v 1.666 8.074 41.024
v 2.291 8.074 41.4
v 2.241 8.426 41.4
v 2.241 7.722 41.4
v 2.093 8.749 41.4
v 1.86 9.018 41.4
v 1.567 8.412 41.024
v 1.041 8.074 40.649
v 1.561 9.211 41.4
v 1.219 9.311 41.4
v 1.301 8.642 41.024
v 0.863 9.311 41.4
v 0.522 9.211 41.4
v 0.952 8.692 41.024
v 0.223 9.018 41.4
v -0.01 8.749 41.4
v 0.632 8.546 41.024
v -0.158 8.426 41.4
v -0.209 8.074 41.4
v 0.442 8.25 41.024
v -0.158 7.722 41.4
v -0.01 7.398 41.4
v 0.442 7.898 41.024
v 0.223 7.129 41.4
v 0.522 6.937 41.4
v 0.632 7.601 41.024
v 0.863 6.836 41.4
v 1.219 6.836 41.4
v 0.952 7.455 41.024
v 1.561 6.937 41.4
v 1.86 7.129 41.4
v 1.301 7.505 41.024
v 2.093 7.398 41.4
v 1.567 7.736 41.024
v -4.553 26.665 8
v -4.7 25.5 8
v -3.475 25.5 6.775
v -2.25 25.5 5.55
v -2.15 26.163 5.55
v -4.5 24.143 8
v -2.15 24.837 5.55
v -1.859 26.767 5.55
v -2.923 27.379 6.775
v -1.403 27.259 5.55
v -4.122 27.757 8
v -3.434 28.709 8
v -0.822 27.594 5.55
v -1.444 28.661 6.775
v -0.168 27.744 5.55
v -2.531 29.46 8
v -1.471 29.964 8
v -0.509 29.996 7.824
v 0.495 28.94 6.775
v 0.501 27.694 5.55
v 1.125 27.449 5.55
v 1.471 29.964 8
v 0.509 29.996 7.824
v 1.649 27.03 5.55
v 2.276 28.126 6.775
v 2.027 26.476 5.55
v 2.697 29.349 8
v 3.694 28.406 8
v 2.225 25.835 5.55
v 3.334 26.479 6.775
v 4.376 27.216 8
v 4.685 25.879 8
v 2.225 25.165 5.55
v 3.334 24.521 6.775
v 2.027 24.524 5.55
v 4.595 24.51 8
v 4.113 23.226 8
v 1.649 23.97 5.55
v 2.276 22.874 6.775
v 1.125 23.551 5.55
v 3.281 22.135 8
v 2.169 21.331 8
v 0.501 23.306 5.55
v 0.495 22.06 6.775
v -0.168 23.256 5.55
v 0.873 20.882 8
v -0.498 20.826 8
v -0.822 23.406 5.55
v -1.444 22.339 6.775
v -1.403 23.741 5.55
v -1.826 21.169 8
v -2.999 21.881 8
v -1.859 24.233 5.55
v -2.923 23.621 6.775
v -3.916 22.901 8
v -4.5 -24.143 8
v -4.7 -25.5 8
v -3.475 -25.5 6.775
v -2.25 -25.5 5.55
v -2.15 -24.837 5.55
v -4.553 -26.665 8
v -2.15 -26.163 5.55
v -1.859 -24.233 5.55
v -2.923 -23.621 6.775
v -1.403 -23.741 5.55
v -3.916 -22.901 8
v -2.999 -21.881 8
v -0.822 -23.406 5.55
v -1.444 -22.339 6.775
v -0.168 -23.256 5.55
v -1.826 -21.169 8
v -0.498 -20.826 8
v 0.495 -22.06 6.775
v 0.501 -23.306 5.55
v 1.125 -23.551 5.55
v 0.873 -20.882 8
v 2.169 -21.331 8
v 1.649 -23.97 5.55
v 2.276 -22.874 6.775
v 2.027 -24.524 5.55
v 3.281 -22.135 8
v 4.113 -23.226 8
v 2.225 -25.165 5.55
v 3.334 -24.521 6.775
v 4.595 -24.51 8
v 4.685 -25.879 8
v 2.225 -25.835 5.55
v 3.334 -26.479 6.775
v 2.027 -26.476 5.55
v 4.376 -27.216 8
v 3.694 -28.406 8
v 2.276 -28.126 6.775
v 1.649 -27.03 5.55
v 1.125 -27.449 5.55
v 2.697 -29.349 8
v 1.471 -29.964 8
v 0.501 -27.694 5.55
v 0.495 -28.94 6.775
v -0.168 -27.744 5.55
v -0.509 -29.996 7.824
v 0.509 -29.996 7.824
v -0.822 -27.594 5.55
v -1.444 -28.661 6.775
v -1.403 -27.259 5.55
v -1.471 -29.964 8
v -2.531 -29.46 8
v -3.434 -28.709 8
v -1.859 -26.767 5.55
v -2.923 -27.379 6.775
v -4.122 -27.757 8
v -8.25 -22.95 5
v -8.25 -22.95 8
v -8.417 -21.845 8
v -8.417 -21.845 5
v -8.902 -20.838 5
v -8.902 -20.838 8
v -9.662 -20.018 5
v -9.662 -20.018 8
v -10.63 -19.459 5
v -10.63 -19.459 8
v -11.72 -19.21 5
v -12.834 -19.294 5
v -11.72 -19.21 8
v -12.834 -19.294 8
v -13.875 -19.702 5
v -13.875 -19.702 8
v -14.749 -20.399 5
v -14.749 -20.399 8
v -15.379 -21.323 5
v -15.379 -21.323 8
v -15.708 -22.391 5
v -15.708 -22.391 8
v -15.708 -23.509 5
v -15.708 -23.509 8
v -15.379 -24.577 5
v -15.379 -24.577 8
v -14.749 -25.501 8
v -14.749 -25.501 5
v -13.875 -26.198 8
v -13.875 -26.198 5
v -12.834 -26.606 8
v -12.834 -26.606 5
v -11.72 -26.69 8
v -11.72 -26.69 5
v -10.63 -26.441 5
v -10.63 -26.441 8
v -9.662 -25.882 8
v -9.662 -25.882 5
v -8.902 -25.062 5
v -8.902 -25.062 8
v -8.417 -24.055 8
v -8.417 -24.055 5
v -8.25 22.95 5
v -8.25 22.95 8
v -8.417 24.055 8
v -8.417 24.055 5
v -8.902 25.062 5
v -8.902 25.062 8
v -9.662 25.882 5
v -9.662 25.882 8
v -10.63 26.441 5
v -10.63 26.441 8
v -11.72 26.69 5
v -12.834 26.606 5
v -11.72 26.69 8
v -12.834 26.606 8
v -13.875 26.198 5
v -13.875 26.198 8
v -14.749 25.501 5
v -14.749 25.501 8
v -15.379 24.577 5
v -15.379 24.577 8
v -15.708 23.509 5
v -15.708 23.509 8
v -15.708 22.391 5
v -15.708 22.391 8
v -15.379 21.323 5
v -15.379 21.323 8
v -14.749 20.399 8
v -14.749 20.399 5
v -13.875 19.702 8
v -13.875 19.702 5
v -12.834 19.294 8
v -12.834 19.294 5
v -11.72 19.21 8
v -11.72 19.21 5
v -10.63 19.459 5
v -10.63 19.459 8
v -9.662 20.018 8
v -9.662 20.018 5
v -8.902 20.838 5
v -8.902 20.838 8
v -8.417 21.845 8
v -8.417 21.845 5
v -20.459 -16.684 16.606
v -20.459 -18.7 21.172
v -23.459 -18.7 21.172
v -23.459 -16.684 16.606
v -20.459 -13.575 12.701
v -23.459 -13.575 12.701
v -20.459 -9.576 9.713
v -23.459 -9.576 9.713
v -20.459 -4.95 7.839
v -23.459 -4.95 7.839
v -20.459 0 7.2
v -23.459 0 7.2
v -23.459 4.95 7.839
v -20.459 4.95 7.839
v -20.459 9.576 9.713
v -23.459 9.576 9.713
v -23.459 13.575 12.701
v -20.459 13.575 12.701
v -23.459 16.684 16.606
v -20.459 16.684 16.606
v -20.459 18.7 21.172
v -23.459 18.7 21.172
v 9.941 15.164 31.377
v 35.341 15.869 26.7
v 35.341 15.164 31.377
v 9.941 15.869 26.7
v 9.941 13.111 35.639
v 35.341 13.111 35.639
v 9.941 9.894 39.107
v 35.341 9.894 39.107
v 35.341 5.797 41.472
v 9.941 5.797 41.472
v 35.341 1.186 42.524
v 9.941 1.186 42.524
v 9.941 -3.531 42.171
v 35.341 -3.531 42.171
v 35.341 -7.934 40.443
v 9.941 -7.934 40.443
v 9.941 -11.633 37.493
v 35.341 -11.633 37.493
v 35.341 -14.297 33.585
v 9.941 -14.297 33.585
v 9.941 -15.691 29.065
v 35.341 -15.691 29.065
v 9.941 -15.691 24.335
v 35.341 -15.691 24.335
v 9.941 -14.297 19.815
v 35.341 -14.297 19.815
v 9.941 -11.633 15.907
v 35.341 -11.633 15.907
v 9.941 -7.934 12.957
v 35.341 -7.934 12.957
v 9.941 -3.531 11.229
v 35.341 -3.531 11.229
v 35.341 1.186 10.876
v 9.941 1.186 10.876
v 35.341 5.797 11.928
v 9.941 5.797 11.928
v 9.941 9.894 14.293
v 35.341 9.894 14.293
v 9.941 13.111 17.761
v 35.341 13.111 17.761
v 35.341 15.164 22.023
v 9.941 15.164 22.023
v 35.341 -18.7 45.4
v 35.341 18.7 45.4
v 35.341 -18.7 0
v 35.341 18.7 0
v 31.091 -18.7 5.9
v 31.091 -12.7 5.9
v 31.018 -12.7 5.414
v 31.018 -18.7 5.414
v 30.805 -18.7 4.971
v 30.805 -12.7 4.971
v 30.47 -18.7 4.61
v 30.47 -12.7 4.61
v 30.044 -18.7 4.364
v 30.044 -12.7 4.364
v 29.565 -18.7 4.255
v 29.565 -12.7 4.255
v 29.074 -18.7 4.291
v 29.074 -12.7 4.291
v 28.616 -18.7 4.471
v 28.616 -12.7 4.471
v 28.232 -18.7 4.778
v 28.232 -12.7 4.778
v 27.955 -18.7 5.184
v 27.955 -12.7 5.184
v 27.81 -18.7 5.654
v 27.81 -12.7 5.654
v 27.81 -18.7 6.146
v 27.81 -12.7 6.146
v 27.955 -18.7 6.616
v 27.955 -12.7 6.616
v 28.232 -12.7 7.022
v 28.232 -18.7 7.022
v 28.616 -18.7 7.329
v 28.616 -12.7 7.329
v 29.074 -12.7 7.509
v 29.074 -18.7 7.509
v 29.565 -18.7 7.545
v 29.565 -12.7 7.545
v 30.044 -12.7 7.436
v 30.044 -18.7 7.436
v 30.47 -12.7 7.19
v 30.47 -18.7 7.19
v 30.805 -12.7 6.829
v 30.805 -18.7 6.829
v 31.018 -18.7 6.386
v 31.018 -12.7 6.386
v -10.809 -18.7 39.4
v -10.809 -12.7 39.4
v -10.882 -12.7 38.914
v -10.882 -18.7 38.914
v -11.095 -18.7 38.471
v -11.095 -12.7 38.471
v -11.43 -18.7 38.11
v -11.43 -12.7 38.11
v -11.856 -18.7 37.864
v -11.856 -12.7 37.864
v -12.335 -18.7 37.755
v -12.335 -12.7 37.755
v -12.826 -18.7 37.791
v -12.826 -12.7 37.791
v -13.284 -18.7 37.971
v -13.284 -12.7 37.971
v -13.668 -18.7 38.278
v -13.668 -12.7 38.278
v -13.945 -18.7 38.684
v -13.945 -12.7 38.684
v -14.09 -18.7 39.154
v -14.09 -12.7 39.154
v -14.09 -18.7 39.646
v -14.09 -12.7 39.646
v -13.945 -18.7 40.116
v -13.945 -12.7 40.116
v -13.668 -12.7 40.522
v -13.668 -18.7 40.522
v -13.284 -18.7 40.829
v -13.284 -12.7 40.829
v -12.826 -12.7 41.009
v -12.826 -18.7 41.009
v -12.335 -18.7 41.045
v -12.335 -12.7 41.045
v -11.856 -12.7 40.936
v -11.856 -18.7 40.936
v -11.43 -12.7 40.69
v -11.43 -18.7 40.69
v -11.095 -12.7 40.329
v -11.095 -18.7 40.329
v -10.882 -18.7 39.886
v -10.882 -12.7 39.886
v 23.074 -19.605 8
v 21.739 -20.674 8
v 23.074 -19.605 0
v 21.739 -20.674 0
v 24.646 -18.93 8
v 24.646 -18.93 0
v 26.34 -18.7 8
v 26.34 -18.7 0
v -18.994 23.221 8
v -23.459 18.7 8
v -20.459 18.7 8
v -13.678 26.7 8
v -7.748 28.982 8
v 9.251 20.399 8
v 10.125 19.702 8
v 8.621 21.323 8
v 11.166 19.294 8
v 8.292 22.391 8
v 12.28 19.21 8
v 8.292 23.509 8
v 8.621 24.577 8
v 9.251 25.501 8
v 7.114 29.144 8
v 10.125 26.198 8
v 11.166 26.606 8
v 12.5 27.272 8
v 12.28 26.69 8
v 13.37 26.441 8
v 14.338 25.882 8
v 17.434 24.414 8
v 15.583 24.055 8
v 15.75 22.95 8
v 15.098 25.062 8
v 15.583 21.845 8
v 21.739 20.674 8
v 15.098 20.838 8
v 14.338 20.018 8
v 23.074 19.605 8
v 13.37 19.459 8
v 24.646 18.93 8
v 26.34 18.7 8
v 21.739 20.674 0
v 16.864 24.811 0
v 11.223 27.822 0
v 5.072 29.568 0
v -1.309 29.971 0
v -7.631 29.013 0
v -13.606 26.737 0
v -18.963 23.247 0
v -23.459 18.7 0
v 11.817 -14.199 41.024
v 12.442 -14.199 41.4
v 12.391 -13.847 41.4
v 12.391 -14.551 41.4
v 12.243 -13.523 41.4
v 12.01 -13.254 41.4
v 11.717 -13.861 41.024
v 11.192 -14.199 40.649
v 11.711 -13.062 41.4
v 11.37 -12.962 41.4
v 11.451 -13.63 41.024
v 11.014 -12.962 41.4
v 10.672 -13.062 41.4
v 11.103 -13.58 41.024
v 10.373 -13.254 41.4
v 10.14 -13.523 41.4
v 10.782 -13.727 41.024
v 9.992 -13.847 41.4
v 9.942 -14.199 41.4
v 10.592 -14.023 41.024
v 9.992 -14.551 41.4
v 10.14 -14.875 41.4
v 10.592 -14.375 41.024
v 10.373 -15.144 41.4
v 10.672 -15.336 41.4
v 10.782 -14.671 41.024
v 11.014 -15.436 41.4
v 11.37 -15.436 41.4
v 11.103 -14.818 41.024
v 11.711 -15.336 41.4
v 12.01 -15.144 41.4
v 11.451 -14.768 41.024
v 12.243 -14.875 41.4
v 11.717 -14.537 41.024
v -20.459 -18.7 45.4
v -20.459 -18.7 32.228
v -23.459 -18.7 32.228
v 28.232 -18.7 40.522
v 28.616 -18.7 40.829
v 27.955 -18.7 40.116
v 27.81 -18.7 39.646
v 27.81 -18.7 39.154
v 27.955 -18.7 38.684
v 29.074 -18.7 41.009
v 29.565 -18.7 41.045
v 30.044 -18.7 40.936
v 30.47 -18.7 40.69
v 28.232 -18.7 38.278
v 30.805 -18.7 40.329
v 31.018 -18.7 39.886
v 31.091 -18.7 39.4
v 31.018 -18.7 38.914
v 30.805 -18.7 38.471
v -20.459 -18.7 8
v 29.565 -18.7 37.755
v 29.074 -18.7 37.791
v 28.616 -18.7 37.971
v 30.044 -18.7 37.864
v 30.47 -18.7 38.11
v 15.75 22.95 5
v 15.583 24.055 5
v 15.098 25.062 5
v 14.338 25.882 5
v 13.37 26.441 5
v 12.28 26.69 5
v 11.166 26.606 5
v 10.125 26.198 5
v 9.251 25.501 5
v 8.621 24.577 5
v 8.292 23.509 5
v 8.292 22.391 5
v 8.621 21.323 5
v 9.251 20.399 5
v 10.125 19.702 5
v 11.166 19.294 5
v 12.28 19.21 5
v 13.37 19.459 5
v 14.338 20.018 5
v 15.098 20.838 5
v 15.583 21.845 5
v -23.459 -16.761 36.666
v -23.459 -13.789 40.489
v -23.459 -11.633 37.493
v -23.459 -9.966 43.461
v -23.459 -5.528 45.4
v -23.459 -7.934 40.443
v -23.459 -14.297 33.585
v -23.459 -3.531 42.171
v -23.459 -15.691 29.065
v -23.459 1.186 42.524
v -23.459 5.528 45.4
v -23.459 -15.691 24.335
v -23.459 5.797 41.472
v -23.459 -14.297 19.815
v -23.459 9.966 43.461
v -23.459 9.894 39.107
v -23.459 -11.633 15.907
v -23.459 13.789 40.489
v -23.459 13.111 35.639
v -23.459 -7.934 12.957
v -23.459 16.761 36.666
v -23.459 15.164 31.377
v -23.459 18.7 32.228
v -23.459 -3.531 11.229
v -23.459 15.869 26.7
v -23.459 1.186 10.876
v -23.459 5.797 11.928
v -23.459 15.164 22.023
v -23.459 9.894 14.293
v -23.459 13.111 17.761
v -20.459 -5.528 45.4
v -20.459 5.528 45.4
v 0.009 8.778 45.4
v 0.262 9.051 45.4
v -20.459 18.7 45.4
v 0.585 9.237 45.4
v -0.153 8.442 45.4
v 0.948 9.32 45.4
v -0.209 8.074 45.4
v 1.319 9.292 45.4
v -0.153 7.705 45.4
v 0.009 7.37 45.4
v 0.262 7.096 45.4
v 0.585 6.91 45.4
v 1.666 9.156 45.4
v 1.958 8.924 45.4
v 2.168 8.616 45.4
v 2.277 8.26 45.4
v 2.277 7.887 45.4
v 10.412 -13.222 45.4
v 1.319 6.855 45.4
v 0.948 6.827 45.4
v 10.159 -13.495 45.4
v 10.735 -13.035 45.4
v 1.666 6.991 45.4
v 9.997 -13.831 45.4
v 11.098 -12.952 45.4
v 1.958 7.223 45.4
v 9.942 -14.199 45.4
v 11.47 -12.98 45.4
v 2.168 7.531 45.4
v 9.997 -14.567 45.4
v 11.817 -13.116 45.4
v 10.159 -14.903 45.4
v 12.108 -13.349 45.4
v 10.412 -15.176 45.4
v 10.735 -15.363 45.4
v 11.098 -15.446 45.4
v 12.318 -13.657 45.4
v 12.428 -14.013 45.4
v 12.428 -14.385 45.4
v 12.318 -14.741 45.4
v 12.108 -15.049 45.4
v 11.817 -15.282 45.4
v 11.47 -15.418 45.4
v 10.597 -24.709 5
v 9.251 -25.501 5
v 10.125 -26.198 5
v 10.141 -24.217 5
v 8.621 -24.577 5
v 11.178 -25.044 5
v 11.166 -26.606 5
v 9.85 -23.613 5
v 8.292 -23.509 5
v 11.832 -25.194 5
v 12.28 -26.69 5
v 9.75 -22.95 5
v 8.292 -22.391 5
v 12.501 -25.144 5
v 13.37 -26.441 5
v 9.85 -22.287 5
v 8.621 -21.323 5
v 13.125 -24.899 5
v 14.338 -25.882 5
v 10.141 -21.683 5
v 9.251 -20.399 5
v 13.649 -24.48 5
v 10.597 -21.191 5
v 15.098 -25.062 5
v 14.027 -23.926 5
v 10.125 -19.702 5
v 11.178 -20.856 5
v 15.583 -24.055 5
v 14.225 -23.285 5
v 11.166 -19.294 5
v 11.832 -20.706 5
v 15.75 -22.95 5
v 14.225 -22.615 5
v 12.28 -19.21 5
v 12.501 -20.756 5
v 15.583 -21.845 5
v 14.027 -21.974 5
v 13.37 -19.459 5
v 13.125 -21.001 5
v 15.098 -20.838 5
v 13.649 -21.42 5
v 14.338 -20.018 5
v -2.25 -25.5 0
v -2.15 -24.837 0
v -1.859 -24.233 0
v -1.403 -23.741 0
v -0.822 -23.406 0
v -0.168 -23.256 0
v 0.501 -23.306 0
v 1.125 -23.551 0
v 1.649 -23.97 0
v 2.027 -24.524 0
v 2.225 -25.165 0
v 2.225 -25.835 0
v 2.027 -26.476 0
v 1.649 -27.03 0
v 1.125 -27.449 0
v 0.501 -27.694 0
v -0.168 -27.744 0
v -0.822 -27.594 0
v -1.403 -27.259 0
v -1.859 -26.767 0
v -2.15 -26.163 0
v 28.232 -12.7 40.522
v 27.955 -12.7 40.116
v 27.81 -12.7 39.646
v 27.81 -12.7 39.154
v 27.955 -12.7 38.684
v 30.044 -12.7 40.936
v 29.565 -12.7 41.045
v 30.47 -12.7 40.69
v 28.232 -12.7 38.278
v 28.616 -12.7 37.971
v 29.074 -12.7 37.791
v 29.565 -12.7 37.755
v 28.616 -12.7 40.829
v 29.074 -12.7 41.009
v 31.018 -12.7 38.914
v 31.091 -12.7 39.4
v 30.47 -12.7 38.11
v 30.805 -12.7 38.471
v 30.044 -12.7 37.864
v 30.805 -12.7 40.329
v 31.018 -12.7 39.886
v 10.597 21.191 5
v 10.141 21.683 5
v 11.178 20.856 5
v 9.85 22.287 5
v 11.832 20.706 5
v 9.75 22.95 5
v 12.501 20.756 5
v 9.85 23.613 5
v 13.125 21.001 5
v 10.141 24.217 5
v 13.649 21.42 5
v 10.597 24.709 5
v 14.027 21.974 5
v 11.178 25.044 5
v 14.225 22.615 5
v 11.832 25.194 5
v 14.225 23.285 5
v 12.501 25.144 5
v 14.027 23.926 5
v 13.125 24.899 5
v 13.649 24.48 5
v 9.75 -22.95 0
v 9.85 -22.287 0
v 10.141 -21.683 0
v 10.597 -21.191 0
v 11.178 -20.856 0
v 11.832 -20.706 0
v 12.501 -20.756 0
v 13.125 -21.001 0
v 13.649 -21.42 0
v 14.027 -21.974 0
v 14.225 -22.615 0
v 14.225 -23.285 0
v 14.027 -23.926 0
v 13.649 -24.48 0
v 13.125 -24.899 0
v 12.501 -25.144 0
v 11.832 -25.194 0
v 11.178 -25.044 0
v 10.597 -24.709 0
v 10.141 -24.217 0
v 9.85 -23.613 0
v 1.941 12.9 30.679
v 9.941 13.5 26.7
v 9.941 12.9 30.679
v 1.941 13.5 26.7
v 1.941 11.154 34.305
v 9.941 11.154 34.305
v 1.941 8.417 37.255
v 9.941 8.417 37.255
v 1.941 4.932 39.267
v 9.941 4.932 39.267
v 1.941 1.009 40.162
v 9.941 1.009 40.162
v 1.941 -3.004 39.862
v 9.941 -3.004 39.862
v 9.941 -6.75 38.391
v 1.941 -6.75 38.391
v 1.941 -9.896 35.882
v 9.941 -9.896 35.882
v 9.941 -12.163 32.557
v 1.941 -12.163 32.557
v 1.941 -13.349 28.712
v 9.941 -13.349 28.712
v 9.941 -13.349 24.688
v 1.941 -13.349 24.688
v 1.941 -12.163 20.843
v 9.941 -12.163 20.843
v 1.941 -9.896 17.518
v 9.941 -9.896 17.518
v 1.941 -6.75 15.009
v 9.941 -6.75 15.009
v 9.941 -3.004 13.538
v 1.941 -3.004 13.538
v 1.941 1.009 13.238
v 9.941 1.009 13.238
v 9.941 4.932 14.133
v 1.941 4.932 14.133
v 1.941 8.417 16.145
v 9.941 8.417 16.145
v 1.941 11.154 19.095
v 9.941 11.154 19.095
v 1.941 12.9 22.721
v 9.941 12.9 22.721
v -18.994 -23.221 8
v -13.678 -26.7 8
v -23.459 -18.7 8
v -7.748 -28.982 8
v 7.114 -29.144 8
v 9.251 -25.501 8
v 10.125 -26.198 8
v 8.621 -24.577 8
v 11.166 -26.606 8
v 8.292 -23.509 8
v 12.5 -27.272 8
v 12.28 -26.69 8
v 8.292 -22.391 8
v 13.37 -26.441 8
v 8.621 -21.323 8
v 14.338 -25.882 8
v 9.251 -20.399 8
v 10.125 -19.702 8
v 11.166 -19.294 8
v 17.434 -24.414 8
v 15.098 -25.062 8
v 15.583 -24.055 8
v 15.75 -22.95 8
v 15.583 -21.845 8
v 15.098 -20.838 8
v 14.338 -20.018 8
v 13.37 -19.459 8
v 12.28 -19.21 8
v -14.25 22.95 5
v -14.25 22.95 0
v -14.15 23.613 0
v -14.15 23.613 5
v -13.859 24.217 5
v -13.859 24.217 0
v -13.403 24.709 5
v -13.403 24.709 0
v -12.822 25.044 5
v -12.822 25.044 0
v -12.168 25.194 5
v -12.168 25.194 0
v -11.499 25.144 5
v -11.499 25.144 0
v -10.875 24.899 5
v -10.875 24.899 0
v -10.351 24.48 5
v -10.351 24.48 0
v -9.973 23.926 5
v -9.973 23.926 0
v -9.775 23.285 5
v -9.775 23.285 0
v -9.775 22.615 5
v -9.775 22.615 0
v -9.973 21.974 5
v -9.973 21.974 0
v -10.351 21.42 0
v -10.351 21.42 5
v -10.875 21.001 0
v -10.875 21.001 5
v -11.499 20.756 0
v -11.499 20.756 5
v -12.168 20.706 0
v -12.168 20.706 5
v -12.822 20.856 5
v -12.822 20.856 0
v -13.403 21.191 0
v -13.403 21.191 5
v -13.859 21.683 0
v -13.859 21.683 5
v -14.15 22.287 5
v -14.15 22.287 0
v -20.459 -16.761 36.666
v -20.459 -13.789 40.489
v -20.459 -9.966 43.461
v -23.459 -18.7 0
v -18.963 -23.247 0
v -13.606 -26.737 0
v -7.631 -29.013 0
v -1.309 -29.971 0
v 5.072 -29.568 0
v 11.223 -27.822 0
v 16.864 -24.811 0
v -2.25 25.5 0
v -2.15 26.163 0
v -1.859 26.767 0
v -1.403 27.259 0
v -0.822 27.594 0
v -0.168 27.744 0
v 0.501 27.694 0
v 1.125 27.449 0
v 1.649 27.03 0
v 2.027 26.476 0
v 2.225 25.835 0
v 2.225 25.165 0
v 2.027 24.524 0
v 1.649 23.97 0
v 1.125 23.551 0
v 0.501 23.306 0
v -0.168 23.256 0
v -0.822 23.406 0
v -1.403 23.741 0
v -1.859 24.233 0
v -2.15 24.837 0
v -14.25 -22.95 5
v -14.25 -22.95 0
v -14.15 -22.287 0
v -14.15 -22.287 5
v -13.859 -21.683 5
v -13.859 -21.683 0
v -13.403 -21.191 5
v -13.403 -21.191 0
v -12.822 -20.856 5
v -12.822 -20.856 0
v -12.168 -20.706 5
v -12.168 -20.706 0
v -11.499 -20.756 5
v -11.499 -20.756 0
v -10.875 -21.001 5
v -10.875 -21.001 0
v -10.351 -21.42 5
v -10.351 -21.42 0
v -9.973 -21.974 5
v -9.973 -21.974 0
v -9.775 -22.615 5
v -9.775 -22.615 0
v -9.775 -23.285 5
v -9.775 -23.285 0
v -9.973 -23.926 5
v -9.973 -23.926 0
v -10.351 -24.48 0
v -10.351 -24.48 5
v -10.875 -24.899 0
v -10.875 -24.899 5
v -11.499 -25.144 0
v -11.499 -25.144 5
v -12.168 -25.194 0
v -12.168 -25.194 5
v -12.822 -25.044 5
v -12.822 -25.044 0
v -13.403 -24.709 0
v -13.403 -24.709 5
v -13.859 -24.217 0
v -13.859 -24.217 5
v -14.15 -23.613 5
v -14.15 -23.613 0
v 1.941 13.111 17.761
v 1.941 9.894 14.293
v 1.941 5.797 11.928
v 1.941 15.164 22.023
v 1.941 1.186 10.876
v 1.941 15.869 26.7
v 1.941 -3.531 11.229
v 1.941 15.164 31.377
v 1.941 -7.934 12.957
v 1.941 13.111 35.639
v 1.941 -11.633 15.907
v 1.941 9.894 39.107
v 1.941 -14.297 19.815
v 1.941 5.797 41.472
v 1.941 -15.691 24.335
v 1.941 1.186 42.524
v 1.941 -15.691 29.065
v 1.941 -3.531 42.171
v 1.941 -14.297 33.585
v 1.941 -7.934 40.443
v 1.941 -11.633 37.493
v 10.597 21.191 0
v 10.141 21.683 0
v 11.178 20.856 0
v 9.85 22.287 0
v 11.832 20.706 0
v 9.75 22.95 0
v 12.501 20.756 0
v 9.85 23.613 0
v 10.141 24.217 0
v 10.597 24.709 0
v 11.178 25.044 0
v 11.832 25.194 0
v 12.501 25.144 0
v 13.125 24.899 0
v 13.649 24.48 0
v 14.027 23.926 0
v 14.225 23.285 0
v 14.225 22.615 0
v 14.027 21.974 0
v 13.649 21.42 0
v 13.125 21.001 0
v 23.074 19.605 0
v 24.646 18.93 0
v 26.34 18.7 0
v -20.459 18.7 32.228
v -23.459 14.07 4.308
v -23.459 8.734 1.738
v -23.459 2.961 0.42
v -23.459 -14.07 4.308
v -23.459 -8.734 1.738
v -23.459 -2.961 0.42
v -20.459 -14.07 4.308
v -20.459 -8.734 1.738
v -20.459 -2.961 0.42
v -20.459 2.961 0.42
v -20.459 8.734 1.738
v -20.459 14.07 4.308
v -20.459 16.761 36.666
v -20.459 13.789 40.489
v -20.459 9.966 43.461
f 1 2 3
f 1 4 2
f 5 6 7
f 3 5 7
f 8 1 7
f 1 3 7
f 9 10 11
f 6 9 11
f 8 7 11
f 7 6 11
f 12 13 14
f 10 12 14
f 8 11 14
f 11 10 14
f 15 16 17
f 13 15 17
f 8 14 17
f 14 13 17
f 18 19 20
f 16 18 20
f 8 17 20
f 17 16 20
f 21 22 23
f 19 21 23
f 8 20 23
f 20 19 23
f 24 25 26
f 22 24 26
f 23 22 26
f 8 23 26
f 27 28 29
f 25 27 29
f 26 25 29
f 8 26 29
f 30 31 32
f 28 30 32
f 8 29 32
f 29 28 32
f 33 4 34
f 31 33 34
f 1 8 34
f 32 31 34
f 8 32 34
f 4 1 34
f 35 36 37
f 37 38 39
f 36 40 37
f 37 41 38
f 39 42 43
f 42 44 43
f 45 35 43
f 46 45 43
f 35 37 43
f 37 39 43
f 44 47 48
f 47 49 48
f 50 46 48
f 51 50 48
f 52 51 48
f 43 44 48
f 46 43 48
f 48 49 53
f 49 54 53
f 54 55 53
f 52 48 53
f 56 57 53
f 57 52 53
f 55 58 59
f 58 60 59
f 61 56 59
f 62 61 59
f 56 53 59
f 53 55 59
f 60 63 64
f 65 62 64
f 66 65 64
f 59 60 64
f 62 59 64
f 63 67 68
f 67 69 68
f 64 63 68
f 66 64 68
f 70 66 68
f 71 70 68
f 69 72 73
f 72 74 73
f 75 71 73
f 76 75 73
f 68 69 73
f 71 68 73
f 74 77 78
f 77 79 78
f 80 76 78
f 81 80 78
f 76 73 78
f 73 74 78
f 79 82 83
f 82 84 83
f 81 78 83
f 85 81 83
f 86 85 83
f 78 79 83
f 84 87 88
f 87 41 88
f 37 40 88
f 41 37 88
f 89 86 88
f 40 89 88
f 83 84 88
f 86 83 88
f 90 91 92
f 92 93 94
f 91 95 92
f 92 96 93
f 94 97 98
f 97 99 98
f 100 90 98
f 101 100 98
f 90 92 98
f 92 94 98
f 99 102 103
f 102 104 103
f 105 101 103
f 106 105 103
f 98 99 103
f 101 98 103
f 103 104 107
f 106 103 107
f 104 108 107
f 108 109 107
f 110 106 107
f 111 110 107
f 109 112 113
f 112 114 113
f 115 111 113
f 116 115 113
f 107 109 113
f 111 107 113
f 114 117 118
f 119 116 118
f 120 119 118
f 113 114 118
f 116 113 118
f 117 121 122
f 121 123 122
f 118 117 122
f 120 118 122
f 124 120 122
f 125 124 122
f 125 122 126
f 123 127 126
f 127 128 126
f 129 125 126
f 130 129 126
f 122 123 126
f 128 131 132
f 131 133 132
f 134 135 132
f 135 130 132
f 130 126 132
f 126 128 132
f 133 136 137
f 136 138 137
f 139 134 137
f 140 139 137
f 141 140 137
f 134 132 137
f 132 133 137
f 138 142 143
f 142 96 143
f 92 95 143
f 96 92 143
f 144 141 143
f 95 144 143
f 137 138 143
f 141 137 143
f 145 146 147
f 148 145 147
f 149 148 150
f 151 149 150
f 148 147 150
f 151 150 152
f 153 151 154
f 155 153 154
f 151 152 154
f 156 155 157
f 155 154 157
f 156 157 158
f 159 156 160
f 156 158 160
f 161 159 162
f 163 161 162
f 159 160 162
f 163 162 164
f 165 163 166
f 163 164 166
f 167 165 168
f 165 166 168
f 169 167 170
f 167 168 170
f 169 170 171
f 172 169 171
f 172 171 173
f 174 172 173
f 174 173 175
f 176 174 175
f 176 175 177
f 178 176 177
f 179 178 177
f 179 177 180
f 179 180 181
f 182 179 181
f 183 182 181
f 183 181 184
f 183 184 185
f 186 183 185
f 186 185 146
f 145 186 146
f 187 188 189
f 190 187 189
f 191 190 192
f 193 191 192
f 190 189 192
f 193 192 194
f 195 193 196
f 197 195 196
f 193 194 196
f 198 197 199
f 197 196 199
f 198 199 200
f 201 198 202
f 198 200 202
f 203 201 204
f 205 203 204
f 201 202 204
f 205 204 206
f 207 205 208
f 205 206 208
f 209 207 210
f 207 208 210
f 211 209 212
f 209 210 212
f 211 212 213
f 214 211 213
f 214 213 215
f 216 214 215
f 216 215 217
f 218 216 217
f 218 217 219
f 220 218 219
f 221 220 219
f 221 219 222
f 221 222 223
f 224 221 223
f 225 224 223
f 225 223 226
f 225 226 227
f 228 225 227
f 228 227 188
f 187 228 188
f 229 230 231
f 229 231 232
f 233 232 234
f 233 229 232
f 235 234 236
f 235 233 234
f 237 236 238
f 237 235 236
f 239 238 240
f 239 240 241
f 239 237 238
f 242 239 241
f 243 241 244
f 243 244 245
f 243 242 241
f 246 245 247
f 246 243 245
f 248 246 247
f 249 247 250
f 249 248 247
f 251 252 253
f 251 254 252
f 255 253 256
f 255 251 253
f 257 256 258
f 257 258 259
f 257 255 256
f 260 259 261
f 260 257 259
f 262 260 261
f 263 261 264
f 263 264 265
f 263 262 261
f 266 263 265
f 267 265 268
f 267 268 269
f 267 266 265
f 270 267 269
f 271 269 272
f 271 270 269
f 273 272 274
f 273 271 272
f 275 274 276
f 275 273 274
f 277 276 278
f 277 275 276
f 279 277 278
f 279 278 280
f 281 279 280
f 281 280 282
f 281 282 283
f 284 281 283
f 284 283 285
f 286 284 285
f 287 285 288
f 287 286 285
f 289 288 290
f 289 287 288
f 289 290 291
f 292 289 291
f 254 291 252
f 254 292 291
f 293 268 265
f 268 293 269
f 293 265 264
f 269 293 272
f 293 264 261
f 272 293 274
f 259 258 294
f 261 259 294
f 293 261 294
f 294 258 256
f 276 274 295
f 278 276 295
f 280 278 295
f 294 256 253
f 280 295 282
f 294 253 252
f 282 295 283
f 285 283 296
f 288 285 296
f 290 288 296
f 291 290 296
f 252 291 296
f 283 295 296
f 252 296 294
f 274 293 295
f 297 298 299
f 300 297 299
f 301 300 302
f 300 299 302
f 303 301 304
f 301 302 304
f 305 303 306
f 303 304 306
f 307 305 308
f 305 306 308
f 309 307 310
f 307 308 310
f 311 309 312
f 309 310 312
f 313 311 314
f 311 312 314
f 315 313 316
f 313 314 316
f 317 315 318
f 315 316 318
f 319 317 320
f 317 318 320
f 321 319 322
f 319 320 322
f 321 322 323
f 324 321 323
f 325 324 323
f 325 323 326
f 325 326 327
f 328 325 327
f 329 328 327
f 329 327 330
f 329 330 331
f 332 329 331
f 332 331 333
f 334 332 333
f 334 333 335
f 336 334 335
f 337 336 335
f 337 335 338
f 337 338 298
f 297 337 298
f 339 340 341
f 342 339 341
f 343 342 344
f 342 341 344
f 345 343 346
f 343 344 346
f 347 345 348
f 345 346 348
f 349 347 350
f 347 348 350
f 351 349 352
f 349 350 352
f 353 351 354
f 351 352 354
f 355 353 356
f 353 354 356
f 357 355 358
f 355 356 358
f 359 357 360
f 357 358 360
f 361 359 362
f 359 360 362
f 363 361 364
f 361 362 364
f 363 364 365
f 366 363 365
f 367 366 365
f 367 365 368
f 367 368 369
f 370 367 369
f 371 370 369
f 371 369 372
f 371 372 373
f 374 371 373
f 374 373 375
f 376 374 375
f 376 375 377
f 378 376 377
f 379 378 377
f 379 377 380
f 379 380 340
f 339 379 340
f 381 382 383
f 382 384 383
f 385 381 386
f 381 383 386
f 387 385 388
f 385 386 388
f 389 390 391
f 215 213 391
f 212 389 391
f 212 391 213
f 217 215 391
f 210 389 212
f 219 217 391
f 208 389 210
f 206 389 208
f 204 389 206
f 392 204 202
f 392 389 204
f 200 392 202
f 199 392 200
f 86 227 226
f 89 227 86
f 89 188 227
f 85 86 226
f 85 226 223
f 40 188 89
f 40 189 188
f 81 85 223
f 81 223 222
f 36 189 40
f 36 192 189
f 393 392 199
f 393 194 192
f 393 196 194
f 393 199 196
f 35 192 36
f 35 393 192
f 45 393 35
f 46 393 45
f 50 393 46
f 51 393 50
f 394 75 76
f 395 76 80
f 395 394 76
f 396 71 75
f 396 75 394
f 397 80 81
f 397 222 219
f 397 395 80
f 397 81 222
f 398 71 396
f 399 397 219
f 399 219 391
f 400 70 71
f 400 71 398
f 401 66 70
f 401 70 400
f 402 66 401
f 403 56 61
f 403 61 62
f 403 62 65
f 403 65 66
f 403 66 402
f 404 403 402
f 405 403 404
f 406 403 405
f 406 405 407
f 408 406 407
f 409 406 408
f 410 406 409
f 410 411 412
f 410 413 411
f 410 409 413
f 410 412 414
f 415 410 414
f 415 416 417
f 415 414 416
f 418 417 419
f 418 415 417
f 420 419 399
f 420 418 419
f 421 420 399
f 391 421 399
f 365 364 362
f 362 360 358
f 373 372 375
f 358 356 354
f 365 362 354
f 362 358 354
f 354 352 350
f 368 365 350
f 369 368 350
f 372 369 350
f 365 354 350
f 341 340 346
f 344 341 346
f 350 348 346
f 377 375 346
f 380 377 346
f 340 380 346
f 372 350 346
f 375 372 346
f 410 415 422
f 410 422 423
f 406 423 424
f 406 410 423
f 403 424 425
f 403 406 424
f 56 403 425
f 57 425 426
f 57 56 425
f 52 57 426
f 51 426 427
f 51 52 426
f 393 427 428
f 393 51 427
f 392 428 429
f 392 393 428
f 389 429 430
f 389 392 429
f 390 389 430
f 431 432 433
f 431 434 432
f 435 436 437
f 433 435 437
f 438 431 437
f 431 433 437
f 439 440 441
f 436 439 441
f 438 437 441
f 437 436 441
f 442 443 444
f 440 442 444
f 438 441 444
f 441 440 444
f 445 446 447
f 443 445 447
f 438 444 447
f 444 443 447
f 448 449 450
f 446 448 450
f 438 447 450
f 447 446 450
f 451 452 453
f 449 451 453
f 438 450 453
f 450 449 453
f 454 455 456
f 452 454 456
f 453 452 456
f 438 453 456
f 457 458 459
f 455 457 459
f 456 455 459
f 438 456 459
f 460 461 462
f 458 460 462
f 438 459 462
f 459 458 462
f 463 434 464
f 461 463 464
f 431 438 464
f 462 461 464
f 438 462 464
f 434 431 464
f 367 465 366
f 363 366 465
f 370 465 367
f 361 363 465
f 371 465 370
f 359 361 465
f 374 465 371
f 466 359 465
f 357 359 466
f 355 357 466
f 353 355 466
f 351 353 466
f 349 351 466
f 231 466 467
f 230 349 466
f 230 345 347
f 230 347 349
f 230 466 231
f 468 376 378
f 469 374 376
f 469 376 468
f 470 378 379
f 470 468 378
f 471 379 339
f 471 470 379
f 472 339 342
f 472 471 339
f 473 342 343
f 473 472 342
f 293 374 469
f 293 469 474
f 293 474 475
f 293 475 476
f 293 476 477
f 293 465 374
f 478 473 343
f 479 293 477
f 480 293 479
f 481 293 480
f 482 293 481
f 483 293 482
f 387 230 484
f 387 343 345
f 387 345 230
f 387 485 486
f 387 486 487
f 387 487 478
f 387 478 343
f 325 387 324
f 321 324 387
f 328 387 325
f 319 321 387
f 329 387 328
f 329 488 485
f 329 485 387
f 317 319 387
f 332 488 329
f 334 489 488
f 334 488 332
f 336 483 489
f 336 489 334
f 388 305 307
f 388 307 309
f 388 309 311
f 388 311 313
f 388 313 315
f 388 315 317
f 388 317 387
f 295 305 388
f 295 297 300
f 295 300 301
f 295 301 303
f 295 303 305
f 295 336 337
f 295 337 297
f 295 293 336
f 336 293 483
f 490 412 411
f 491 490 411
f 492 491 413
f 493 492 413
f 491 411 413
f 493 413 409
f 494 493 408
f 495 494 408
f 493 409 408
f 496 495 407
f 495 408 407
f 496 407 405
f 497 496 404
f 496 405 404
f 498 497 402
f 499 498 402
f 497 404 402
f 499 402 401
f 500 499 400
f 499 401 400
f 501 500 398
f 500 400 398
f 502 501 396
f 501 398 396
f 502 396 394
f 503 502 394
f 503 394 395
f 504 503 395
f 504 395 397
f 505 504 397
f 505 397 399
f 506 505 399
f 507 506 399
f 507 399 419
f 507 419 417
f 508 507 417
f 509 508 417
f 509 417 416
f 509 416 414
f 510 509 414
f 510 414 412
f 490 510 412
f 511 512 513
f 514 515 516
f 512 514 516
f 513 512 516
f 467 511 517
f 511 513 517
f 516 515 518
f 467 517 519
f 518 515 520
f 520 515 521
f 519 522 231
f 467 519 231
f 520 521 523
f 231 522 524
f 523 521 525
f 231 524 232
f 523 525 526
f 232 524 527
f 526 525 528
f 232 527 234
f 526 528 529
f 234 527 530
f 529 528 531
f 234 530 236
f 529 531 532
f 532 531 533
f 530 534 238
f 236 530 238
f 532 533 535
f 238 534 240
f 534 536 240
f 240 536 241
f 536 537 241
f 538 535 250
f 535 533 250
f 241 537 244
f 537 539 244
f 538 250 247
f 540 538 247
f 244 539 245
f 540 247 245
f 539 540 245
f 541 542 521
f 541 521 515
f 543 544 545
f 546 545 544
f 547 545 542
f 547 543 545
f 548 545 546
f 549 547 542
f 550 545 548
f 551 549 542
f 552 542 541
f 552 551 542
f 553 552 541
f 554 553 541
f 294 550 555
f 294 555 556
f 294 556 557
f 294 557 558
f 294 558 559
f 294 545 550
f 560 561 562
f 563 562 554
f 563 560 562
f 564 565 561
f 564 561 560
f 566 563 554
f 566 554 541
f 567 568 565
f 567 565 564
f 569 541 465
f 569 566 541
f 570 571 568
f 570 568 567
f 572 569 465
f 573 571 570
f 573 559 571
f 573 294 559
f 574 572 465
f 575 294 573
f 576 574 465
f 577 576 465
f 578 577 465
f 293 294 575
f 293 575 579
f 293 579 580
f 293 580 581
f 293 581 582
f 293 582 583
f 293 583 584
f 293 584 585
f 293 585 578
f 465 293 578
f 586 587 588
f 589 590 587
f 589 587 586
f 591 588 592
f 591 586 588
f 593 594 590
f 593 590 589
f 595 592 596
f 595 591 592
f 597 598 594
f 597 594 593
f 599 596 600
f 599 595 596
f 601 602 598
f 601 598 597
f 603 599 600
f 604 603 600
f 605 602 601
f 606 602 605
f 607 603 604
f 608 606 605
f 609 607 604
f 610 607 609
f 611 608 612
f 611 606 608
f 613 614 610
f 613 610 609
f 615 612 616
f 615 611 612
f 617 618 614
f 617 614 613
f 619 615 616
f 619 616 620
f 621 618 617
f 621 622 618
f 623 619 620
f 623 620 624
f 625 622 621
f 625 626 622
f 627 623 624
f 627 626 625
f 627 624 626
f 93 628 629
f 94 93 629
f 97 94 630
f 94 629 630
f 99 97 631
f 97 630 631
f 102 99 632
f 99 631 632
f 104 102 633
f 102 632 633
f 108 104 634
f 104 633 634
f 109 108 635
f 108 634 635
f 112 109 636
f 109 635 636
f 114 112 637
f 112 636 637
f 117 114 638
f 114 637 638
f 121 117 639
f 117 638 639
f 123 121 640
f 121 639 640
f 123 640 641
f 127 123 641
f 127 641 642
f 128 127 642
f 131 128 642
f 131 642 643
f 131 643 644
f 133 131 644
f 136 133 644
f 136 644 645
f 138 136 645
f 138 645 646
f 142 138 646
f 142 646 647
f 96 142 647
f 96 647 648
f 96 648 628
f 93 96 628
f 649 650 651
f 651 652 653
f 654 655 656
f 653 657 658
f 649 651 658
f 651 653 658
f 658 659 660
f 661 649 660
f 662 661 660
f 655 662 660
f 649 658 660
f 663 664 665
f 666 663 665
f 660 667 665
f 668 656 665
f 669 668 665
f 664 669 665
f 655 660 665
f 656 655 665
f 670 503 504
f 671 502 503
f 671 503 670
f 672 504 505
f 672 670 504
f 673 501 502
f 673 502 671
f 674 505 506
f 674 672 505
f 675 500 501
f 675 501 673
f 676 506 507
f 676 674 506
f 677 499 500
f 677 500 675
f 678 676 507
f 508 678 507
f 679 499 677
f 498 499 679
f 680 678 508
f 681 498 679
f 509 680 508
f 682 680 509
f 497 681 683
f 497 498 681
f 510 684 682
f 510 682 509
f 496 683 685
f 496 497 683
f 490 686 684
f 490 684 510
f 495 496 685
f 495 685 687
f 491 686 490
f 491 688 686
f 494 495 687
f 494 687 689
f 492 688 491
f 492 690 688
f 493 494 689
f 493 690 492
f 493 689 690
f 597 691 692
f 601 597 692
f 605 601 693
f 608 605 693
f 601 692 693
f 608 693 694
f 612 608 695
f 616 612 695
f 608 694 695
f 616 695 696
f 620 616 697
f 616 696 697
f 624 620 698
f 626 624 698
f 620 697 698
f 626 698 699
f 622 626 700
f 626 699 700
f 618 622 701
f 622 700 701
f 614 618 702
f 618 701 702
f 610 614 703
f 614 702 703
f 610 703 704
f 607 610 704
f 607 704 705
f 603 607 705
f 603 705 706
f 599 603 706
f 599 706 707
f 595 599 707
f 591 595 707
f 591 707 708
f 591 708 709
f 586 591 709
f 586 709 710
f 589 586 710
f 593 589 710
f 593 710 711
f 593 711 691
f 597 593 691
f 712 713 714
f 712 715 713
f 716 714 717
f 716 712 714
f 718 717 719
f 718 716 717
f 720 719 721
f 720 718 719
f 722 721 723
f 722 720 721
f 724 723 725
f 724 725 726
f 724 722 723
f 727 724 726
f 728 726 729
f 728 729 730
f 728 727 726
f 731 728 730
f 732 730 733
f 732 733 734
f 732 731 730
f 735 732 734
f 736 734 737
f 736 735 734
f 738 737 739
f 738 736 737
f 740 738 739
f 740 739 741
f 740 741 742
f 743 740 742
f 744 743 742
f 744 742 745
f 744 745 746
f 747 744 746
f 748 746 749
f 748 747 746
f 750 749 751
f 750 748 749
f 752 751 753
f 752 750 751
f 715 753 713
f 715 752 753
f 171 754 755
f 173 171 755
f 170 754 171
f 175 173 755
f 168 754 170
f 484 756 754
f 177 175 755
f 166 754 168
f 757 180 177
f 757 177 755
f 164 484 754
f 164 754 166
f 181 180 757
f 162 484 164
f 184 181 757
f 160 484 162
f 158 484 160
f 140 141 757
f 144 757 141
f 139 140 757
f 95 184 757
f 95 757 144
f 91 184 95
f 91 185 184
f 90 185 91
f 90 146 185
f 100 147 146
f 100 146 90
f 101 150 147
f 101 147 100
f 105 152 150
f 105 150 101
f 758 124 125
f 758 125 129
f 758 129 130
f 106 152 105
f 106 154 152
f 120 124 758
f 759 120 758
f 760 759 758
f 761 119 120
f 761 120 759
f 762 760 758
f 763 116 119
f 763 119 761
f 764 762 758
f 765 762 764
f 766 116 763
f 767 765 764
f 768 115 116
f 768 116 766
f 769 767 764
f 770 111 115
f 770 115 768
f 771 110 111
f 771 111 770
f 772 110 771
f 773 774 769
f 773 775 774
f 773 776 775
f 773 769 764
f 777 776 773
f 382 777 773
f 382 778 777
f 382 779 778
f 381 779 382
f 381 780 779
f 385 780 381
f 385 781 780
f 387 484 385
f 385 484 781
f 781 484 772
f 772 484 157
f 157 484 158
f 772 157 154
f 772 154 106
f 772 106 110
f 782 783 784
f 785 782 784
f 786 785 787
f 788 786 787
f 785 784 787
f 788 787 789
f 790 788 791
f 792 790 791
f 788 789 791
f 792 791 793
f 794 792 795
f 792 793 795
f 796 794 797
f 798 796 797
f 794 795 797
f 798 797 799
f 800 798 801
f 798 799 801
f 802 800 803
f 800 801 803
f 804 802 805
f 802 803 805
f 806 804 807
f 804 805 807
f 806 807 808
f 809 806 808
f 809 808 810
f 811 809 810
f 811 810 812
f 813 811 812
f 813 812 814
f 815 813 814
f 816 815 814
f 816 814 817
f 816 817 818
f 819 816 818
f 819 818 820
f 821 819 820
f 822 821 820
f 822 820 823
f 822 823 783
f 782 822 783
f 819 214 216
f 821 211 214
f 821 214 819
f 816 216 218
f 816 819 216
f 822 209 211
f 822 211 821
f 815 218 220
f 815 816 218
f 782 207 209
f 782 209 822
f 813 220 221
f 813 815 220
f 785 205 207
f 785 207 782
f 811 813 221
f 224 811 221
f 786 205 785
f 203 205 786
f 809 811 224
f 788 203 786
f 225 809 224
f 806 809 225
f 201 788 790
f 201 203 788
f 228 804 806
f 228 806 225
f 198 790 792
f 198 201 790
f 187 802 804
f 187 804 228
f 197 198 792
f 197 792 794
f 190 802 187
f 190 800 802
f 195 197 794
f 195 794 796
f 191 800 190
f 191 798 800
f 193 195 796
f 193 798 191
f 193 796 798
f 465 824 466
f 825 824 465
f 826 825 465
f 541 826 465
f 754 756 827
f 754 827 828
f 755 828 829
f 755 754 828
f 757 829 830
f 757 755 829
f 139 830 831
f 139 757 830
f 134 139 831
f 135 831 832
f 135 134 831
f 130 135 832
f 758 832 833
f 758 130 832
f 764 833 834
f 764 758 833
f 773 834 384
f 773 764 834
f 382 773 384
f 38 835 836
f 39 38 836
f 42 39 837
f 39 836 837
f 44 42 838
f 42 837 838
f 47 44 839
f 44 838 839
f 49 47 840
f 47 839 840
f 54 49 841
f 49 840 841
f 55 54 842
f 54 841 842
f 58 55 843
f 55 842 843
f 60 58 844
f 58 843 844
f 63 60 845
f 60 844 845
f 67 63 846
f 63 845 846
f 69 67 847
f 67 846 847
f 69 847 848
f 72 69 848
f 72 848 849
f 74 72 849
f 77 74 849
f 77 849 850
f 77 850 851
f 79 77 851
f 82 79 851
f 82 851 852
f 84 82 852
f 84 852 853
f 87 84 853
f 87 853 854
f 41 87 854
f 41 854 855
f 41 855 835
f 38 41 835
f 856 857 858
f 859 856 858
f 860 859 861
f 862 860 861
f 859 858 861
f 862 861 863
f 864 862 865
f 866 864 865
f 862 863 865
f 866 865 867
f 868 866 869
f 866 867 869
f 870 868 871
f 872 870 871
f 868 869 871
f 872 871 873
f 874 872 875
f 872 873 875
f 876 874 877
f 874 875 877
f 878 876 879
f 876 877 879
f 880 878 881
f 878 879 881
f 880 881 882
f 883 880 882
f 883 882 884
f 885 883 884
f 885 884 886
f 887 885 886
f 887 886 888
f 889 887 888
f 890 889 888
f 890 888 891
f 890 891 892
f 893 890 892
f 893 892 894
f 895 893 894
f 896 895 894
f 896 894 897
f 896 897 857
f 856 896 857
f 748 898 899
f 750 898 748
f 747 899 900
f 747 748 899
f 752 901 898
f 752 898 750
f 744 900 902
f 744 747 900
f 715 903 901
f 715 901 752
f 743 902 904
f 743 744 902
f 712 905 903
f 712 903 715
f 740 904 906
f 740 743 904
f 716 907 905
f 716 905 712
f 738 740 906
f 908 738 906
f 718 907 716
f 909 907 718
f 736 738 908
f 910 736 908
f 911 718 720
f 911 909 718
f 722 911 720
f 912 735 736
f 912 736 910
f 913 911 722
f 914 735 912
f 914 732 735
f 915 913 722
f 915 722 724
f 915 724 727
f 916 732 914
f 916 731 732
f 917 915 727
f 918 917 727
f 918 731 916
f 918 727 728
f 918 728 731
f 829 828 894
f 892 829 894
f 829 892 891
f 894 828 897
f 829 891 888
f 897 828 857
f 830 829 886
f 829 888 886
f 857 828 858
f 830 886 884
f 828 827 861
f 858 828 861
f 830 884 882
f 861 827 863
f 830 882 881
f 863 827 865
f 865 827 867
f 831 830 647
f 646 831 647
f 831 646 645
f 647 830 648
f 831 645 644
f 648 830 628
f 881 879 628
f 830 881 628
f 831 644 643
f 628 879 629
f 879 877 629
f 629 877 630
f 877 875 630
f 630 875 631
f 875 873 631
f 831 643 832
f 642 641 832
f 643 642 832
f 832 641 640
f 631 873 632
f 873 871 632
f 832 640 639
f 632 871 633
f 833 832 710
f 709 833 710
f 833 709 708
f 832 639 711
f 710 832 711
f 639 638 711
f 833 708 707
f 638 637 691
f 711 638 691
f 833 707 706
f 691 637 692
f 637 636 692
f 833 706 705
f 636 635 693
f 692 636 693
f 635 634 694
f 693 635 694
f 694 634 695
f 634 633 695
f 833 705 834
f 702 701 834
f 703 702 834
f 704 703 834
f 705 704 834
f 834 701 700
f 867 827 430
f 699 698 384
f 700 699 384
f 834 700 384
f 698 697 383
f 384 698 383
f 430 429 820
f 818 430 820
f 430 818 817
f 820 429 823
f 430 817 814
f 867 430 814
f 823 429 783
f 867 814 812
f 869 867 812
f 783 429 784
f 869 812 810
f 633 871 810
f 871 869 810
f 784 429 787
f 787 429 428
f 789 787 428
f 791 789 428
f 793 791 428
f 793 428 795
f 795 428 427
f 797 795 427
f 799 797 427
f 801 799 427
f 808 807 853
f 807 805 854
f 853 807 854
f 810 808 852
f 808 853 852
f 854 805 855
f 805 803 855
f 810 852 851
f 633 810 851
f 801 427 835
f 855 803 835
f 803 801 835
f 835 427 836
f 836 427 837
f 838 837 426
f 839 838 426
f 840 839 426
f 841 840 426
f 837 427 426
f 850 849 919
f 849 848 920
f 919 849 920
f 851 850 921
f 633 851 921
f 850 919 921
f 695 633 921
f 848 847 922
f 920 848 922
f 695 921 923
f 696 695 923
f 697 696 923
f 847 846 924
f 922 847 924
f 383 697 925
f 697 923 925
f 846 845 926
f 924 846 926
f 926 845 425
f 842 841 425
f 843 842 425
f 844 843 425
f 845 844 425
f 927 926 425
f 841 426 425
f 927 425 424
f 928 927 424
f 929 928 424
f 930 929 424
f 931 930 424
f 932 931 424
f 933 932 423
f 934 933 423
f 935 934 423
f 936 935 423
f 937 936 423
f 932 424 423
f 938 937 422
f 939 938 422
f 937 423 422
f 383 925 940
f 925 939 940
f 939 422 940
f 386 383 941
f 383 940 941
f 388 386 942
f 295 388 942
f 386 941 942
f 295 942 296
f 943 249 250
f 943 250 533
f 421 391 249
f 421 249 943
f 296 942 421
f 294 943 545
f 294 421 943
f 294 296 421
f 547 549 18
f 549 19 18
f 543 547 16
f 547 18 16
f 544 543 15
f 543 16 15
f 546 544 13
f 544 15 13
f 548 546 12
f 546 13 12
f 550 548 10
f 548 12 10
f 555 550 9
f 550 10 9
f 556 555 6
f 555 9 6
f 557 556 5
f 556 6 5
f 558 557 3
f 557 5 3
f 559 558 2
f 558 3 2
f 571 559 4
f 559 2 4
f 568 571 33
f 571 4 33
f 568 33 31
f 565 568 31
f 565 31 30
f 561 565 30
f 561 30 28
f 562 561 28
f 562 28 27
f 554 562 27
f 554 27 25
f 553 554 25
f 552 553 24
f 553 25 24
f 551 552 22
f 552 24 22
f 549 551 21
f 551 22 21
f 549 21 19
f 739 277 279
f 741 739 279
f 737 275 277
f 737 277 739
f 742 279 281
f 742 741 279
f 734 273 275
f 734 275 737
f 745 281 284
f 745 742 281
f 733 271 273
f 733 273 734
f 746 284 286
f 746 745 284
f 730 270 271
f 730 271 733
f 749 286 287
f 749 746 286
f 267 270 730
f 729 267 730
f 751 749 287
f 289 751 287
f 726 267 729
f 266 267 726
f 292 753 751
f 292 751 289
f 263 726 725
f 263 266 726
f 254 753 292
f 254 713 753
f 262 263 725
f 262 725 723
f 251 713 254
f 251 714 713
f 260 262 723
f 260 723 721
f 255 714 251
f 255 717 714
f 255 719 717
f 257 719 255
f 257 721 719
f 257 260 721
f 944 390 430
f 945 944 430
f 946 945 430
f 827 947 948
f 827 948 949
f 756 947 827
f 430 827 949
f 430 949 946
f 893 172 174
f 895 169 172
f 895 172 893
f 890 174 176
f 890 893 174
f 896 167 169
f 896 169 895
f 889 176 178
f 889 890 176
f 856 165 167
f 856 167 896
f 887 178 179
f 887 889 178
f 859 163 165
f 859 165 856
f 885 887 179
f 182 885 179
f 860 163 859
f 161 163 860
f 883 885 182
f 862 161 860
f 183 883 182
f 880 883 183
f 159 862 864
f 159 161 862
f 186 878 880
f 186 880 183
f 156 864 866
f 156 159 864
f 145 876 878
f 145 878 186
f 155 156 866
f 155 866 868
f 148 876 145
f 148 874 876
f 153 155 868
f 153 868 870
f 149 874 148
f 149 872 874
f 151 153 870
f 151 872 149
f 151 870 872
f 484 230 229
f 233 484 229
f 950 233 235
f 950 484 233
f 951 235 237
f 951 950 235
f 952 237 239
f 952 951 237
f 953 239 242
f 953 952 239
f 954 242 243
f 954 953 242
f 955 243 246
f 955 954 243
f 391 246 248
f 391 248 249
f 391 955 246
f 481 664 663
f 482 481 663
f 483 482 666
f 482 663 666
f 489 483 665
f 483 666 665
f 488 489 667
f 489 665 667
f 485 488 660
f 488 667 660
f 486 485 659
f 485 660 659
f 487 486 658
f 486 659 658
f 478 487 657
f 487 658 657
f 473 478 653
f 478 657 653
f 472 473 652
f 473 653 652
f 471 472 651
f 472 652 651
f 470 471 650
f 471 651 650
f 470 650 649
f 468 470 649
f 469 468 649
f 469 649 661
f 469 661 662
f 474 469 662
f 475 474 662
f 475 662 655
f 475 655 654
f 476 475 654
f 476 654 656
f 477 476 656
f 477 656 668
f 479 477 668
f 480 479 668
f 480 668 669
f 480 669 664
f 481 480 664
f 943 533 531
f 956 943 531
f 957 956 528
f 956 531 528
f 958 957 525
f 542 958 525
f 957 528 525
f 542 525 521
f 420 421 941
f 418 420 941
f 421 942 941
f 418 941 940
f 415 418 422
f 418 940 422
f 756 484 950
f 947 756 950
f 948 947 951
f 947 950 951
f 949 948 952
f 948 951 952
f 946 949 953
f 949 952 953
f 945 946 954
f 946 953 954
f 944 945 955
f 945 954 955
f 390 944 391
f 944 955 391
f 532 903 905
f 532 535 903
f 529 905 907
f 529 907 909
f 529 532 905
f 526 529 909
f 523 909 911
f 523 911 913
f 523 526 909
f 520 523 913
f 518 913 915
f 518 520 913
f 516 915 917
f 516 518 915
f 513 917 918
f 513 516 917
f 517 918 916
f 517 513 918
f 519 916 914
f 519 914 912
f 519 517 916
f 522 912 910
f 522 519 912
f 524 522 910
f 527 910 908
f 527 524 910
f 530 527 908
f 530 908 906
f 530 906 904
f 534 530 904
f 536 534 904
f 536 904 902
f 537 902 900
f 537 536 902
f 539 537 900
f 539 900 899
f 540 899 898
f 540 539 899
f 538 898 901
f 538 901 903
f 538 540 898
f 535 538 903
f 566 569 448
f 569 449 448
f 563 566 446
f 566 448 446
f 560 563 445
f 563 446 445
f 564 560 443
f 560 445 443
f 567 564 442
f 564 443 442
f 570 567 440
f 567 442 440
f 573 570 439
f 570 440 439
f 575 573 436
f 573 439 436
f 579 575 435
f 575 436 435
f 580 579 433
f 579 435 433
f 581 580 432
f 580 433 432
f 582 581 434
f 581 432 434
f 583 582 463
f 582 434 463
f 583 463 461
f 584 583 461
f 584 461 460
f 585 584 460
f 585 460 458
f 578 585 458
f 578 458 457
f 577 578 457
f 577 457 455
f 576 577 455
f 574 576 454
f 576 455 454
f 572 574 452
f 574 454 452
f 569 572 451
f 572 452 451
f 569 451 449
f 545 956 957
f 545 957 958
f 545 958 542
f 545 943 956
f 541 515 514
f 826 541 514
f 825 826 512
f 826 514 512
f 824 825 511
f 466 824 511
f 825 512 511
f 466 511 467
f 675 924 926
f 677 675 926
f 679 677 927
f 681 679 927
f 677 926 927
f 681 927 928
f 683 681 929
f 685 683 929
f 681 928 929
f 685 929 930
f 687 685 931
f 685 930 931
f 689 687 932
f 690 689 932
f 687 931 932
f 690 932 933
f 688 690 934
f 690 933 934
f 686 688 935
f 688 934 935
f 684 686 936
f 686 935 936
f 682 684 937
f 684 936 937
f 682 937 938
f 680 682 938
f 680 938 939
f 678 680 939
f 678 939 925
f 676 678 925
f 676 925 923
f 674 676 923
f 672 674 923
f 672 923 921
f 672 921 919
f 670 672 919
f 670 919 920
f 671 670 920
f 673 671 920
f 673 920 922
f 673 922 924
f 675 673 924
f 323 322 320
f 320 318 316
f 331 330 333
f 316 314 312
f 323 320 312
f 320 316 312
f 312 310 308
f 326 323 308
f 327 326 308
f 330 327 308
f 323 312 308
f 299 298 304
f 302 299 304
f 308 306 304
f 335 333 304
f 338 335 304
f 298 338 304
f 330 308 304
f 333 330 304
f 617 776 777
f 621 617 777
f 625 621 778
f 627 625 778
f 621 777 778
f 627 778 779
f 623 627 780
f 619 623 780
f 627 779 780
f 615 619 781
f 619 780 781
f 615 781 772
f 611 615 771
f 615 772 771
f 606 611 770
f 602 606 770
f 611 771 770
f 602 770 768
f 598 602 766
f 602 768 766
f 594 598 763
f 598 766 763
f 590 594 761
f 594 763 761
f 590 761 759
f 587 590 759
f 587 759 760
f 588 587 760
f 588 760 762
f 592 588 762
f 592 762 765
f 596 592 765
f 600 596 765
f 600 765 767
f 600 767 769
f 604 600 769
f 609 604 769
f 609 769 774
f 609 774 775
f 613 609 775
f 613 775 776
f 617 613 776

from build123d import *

# Parameters (mm, degrees)
BOSS_EXTRUDE1_DEPTH                                 = 8
CUT_EXTRUDE1_REACH                                  = 5
SKETCH4_W                                           = 55.8
SKETCH4_H                                           = 37.4
BOSS_EXTRUDE2_DEPTH                                 = 37.4
BOSS_EXTRUDE3_DEPTH                                 = 3
CUT_EXTRUDE2_DEPTH                                  = 3
CUT_EXTRUDE3_DEPTH                                  = 3
CSK_FOR_8_FLAT_HEAD_MACHINE_SCREW_100_D             = 4.5
CSK_FOR_8_FLAT_HEAD_MACHINE_SCREW_100_DEPTH         = 8
CSK_FOR_8_FLAT_HEAD_MACHINE_SCREW_100_CSINK_D       = 9.4
CSK_FOR_8_FLAT_HEAD_MACHINE_SCREW_100_CSINK_ANGLE   = 90
F_4_CLEARANCE_HOLE1_D                               = 3.3
F_4_CLEARANCE_HOLE1_DEPTH                           = 6
CBORE_FOR_8_BINDING_HEAD_MACHINE_SCREW1_D           = 4.5
CBORE_FOR_8_BINDING_HEAD_MACHINE_SCREW1_DEPTH       = 8
CBORE_FOR_8_BINDING_HEAD_MACHINE_SCREW1_CBORE_D     = 7.5
CBORE_FOR_8_BINDING_HEAD_MACHINE_SCREW1_CBORE_DEPTH = 3
FILLET1_R                                           = 6.35
M3X0_5_TAPPED_HOLE1_D                               = 2.5
M3X0_5_TAPPED_HOLE1_DEPTH                           = 4
M3X0_5_TAPPED_HOLE1_TIP                             = 0.751075774
FILLET2_R                                           = 6.35


with BuildPart() as part:
    # Sketch1 → Boss-Extrude1 (new body)
    with BuildSketch(Plane.XY.offset(8)):
        with BuildLine():
            Line((-23.45868709, 18.7), (-23.45868709, -18.7))
            ThreePointArc((-23.45868709, -18.7), (0, -30), (23.45868709, -18.7))
            Line((23.45868709, -18.7), (35.34131291, -18.7))
            Line((35.34131291, -18.7), (35.34131291, 18.7))
            Line((35.34131291, 18.7), (23.45868709, 18.7))
            ThreePointArc((23.45868709, 18.7), (0, 30), (-23.45868709, 18.7))
        make_face()
    extrude(amount=-BOSS_EXTRUDE1_DEPTH)

    # Sketch3 → Cut-Extrude1 (cut, up to next)
    with BuildSketch(Plane(origin=(-20.45868709, 0, 0), x_dir=(0, 0, -1), z_dir=(1, 0, 0)), mode=Mode.PRIVATE) as cut_extrude1_sk1:
        with BuildLine():
            Line((-8, 18.7), (-8, -18.7))
            ThreePointArc((-8, -18.7), (-0.254206384, 0), (-8, 18.7))
        make_face()
    cut_extrude1_tool1 = extrude(cut_extrude1_sk1.sketch, amount=-CUT_EXTRUDE1_REACH, mode=Mode.PRIVATE) & part.part
    add(cut_extrude1_tool1.solids().sort_by_distance((-20.458687, 0, 4.859168))[0], mode=Mode.SUBTRACT)

    # Sketch4 → Boss-Extrude2 (add)
    with BuildSketch(Plane.XY.offset(8)):
        with Locations((7.44131291, 0)):
            Rectangle(SKETCH4_W, SKETCH4_H)
    extrude(amount=BOSS_EXTRUDE2_DEPTH)

    # Sketch5 → Boss-Extrude3 (add)
    with BuildSketch(Plane.ZY.offset(20.45868709)):
        with BuildLine():
            Line((21.171890016, 18.7), (45.4, 18.7))
            Line((45.4, 18.7), (45.4, -18.7))
            Line((45.4, -18.7), (21.171890016, -18.7))
            ThreePointArc((21.171890016, -18.7), (7.2, 0), (21.171890016, 18.7))
        make_face()
    extrude(amount=BOSS_EXTRUDE3_DEPTH)

    # Sketch6 → Cut-Extrude2 (cut)
    with BuildSketch(Plane.ZY.offset(23.45868709)):
        with BuildLine():
            Line((45.4, -18.7), (45.4, -5.528109984))
            ThreePointArc((45.4, -5.528109984), (40.488582233, -13.788582233), (32.228109984, -18.7))
            Line((32.228109984, -18.7), (45.4, -18.7))
        make_face()
    extrude(amount=-CUT_EXTRUDE2_DEPTH, mode=Mode.SUBTRACT)

    # Sketch7 → Cut-Extrude3 (cut)
    with BuildSketch(Plane.ZY.offset(23.45868709)):
        with BuildLine():
            Line((45.4, 18.7), (32.228109984, 18.7))
            ThreePointArc((32.228109984, 18.7), (40.488582233, 13.788582233), (45.4, 5.528109984))
            Line((45.4, 5.528109984), (45.4, 18.7))
        make_face()
    extrude(amount=-CUT_EXTRUDE3_DEPTH, mode=Mode.SUBTRACT)

    # Sketch8 → Cut-Revolve1 (revolve, cut)
    with BuildSketch(Plane.XY.offset(26.7)):
        Polygon((-23.45868709, 15.86865), (-23.45868709, 0), (35.34131291, 0), (35.34131291, 15.86865), (9.94131291, 15.86865), (9.94131291, 13.5), (1.94131291, 13.5), (1.94131291, 15.86865), align=None)
    revolve(axis=Axis((-23.45868709, 0, 26.7), (1, 0, 0)), mode=Mode.SUBTRACT)

    # CSK for #8 Flat Head Machine Screw (100)1
    with Locations(Plane.XY.offset(8)):
        with Locations((0, 25.5), (0, -25.5)):
            CounterSinkHole(CSK_FOR_8_FLAT_HEAD_MACHINE_SCREW_100_D / 2, CSK_FOR_8_FLAT_HEAD_MACHINE_SCREW_100_CSINK_D / 2, depth=CSK_FOR_8_FLAT_HEAD_MACHINE_SCREW_100_DEPTH, counter_sink_angle=CSK_FOR_8_FLAT_HEAD_MACHINE_SCREW_100_CSINK_ANGLE)

    # #4 Clearance Hole1
    with Locations(Plane(origin=(0, -18.7, 0), x_dir=(-1, 0, 0), z_dir=(0, -1, 0))):
        with Locations((12.45868709, -39.4), (-29.44131291, -39.4), (-29.44131291, -5.9)):
            Hole(F_4_CLEARANCE_HOLE1_D / 2, depth=F_4_CLEARANCE_HOLE1_DEPTH)

    # CBORE for #8 Binding Head Machine Screw1
    with Locations(Plane.XY.offset(8)):
        with Locations((12, 22.95), (-12, 22.95), (-12, -22.95), (12, -22.95)):
            CounterBoreHole(CBORE_FOR_8_BINDING_HEAD_MACHINE_SCREW1_D / 2, CBORE_FOR_8_BINDING_HEAD_MACHINE_SCREW1_CBORE_D / 2, CBORE_FOR_8_BINDING_HEAD_MACHINE_SCREW1_CBORE_DEPTH, depth=CBORE_FOR_8_BINDING_HEAD_MACHINE_SCREW1_DEPTH)

    # Fillet1
    fillet1_edges = [part.edges().sort_by_distance(p)[0] for p in [
        (23.45868709, 18.7, 4),
    ]]
    fillet(fillet1_edges, radius=FILLET1_R)

    # M3x0.5 Tapped Hole1
    with Locations(Plane(origin=(1.04131291, 8.07366885, 45.4), x_dir=(1, 0, 0), z_dir=(0, 0, 1))):
        with Locations((0, 0), (10.150400418, -22.272670952)):
            Hole(M3X0_5_TAPPED_HOLE1_D / 2, depth=M3X0_5_TAPPED_HOLE1_DEPTH)
            with Locations((0, 0, -(M3X0_5_TAPPED_HOLE1_DEPTH + M3X0_5_TAPPED_HOLE1_TIP / 2))):  # 118° drill point
                Cone(0, M3X0_5_TAPPED_HOLE1_D / 2, M3X0_5_TAPPED_HOLE1_TIP, mode=Mode.SUBTRACT)

    # Fillet2
    fillet2_edges = [part.edges().sort_by_distance(p)[0] for p in [
        (23.45868709, -18.7, 4),
    ]]
    fillet(fillet2_edges, radius=FILLET2_R)


solid = part.part
